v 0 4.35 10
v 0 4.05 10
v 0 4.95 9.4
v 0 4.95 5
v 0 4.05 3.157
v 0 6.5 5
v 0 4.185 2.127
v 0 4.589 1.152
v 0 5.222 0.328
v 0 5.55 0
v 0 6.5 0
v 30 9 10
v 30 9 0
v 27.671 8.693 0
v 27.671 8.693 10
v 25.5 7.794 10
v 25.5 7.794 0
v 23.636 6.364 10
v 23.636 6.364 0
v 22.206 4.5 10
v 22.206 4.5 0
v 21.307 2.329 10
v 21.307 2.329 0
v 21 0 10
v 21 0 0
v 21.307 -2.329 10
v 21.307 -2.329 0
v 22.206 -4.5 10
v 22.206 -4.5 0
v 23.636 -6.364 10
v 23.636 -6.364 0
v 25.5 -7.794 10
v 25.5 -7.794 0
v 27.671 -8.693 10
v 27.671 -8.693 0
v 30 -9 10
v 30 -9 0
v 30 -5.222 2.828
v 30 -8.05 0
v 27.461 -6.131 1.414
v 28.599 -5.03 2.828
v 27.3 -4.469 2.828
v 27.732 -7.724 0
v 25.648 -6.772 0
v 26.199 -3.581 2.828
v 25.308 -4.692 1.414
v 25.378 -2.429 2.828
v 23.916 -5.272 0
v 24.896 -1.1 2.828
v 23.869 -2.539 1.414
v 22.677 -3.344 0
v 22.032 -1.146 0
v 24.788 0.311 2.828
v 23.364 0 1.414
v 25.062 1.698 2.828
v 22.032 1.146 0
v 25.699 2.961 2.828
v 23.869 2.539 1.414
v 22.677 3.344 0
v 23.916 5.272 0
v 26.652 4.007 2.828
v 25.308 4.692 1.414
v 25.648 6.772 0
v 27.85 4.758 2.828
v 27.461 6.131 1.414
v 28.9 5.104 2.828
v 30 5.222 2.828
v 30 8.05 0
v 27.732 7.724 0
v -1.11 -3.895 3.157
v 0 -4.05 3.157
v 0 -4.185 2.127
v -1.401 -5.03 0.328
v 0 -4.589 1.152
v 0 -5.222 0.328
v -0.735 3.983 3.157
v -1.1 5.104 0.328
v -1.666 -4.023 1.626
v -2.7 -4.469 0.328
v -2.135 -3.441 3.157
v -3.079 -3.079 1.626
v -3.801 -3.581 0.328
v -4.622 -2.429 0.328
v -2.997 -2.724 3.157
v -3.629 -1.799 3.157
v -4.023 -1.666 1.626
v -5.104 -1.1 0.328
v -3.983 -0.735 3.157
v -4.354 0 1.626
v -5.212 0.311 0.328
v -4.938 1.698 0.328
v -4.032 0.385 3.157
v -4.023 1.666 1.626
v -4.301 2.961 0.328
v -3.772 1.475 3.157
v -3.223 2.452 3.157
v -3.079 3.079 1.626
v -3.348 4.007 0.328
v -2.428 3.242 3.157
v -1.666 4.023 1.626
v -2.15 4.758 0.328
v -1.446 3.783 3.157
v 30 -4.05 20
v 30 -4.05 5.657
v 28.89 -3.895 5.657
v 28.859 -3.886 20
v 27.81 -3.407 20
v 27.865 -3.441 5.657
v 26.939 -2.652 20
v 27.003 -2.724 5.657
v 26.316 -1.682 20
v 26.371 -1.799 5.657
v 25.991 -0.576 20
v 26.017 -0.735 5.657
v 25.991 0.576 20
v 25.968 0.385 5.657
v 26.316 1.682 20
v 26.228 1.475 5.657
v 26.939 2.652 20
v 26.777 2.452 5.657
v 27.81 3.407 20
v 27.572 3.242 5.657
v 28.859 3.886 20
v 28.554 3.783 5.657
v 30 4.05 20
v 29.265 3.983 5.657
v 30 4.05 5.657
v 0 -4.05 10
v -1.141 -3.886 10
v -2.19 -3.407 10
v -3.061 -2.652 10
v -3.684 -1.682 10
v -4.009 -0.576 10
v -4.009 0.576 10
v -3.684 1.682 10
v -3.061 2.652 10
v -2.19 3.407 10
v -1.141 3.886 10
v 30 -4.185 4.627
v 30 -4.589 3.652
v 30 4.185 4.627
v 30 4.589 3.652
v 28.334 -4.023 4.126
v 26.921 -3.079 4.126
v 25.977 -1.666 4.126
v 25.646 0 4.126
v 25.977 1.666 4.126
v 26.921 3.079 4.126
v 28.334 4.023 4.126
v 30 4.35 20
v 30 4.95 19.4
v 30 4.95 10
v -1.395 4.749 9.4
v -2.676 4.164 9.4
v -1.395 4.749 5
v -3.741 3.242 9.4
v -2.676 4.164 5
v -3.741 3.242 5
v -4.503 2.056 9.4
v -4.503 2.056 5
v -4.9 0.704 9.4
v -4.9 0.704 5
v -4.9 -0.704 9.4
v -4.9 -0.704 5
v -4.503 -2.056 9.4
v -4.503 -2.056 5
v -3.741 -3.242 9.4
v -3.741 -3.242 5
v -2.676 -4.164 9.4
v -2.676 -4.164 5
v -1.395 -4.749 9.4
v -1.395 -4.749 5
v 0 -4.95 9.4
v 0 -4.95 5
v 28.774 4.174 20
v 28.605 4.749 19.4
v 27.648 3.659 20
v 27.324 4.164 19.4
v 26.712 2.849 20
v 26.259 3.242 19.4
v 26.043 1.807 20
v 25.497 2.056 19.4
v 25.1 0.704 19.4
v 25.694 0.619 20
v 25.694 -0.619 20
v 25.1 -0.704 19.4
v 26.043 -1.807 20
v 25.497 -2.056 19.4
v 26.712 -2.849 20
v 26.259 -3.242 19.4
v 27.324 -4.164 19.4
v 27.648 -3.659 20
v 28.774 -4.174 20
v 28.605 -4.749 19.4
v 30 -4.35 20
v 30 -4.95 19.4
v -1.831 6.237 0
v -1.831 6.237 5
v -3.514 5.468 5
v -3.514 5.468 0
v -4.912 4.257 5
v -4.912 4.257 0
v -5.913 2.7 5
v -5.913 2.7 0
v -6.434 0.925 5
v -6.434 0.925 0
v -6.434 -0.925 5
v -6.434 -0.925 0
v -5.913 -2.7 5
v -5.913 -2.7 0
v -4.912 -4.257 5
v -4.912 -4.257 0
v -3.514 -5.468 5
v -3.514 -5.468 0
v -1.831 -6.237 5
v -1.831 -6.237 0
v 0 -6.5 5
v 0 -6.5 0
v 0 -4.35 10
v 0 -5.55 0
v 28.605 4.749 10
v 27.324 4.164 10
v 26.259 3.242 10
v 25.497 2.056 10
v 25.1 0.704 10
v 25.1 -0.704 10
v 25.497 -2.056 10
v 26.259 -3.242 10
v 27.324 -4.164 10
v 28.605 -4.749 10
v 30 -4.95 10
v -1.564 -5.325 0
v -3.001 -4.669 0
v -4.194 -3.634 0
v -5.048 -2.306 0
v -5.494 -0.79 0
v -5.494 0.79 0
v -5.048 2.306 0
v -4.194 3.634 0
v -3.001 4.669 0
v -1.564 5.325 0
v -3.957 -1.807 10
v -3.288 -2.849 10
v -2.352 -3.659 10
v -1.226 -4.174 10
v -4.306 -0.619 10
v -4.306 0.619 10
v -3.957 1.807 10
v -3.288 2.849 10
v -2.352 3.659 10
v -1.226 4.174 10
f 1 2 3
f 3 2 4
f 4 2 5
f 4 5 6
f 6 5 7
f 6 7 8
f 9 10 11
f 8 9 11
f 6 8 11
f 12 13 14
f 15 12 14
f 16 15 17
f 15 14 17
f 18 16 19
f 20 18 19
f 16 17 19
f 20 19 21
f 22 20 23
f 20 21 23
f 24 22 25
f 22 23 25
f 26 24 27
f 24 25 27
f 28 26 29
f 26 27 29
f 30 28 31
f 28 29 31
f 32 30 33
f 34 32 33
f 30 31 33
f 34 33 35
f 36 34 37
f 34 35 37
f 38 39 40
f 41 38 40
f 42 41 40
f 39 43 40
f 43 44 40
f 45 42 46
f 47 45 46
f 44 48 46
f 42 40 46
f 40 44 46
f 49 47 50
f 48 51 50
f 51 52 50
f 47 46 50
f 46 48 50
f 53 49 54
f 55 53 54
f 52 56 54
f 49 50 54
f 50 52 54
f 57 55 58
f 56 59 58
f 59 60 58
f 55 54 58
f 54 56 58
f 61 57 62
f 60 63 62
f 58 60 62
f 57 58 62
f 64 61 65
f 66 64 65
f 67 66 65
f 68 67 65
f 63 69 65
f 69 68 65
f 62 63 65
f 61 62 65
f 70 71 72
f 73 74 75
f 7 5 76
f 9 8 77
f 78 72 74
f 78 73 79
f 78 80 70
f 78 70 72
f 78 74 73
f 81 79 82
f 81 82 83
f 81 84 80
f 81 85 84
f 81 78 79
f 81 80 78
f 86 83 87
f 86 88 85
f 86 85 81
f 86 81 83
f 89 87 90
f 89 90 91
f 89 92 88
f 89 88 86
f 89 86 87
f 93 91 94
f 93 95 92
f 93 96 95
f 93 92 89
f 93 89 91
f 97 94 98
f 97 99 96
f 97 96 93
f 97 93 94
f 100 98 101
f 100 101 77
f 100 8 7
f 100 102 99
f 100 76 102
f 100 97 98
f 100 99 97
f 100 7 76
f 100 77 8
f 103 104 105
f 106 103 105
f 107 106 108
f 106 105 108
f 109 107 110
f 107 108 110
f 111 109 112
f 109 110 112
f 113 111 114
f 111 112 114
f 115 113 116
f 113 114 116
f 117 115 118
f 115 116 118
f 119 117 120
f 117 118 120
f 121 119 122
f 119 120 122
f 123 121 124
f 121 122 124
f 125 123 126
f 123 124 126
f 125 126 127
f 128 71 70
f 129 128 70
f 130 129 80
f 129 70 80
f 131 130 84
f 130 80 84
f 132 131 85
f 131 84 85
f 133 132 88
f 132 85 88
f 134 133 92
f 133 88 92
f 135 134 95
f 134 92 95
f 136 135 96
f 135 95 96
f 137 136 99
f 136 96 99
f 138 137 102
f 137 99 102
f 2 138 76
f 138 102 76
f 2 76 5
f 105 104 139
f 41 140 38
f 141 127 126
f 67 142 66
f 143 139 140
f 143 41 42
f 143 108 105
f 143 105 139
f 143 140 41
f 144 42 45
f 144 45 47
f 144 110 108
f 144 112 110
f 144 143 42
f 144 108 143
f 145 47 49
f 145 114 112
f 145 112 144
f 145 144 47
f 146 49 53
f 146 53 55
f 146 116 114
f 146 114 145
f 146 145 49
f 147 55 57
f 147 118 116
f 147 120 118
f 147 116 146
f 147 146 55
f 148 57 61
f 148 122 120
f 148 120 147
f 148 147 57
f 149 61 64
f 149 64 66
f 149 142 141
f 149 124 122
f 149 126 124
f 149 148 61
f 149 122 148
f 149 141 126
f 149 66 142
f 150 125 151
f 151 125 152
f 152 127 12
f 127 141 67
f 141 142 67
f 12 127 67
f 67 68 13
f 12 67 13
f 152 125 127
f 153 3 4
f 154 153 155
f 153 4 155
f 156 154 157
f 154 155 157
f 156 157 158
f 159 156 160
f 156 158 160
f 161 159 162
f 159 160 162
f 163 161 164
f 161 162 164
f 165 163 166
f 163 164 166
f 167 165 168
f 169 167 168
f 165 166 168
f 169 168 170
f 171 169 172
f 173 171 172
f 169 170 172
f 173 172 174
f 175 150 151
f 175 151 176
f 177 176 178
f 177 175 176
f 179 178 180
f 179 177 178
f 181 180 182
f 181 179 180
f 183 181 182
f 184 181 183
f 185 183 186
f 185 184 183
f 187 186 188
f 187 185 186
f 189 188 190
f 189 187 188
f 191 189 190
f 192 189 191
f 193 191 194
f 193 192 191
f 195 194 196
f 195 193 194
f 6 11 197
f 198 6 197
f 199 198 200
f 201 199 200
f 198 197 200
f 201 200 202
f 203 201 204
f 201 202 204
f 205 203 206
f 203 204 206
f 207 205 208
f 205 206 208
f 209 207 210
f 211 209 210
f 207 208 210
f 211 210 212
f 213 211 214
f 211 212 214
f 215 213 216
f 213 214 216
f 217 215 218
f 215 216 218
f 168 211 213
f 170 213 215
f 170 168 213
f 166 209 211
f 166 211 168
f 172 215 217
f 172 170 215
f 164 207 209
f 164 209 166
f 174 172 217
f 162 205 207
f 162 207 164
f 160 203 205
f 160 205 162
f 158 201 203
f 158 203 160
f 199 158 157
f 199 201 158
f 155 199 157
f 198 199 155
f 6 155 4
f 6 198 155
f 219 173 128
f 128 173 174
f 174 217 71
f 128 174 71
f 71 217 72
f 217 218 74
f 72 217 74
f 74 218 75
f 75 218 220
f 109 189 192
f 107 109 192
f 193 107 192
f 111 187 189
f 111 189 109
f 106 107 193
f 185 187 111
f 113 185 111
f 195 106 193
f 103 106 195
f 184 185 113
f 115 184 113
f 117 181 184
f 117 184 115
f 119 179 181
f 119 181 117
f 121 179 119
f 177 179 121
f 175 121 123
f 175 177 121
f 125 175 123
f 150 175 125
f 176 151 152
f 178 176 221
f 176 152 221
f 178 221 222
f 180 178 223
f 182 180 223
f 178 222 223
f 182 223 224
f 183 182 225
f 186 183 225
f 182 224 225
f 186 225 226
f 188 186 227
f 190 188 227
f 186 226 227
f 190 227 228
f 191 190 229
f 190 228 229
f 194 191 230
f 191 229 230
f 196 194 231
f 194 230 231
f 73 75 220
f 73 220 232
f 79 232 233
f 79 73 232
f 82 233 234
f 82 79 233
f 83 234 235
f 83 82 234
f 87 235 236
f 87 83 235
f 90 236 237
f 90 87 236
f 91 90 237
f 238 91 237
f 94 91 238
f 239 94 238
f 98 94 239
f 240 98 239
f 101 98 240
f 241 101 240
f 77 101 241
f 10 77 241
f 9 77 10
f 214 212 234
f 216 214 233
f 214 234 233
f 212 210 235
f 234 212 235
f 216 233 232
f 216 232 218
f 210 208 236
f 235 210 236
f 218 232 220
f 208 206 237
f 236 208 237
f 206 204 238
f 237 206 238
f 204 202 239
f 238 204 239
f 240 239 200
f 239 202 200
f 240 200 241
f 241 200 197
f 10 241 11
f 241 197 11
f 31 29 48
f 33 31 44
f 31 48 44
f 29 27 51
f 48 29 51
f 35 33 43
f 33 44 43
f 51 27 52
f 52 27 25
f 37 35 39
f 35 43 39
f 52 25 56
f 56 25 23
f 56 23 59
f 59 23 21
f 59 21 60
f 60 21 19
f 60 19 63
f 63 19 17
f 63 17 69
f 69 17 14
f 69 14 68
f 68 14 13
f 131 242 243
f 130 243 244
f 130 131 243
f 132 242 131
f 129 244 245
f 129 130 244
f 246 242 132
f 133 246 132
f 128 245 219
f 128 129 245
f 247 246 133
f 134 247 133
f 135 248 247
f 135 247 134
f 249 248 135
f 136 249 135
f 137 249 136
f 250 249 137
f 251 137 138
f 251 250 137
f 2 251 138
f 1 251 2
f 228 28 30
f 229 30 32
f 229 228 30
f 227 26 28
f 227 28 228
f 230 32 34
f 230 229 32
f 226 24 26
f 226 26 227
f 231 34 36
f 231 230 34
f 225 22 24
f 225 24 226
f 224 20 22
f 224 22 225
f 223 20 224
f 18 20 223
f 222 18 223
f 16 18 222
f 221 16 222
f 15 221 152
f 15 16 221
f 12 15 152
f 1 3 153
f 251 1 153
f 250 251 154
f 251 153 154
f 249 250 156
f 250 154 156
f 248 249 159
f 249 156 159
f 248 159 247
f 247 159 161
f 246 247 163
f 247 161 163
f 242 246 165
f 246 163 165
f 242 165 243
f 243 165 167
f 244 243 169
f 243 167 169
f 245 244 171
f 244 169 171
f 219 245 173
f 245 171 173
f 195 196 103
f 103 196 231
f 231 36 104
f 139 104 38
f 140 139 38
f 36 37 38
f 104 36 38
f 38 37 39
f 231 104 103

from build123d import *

# Parameters (mm, degrees)
F1_DEPTH  = 5
F2_DEPTH  = 10
F3_DEPTH  = 10
F4_DEPTH  = 20
F5_SIZE   = 1.5
F6_SIZE   = 0.6
F6_2_SIZE = 0.6
F7_SIZE   = 4
F8_R      = 4
F8_2_R    = 4


with BuildPart() as f1:
    # F0 (on Top) → F1 (new body)
    with BuildSketch(Plane.XY):
        with BuildLine():
            Line((0, 4.95), (0, 6.5))
            ThreePointArc((0, 6.5), (-6.5, 0), (0, -6.5))
            Line((0, -6.5), (0, -4.95))
            ThreePointArc((0, -4.95), (-4.95, 0), (0, 4.95))
        make_face()
    extrude(amount=F1_DEPTH)

    # F0 (on Top) → F2 (join)
    with BuildSketch(Plane.XY):
        with BuildLine():
            Line((0, 4.05), (0, 4.95))
            ThreePointArc((0, 4.95), (-4.95, 0), (0, -4.95))
            Line((0, -4.95), (0, -4.05))
            ThreePointArc((0, -4.05), (-4.05, 0), (0, 4.05))
        make_face()
    extrude(amount=F2_DEPTH)

    # F5
    f5_edges = [f1.edges().sort_by_distance(p)[0] for p in [
        (-4.05, 0, 0),
    ]]
    chamfer(f5_edges, length=F5_SIZE)

    # F6
    f6_edges = [f1.edges().sort_by_distance(p)[0] for p in [
        (-4.95, 0, 10),
    ]]
    chamfer(f6_edges, length=F6_SIZE)

    # F8
    f8_edges = [f1.edges().sort_by_distance(p)[0] for p in [
        (-4.05, 0, 1.5),
    ]]
    fillet(f8_edges, radius=F8_R)


with BuildPart() as f3:
    # F0 (on Top) → F3 (new body)
    with BuildSketch(Plane.XY):
        with BuildLine():
            Line((30, 4.95), (30, 9))
            ThreePointArc((30, 9), (21, 0), (30, -9))
            Line((30, -9), (30, -4.95))
            ThreePointArc((30, -4.95), (25.05, 0), (30, 4.95))
        make_face()
    extrude(amount=F3_DEPTH)

    # F0 (on Top) → F4 (join)
    with BuildSketch(Plane.XY):
        with BuildLine():
            Line((30, 4.05), (30, 4.95))
            ThreePointArc((30, 4.95), (25.05, 0), (30, -4.95))
            Line((30, -4.95), (30, -4.05))
            ThreePointArc((30, -4.05), (25.95, 0), (30, 4.05))
        make_face()
    extrude(amount=F4_DEPTH)

    # F6#2
    f6_2_edges = [f3.edges().sort_by_distance(p)[0] for p in [
        (25.05, 0, 20),
    ]]
    chamfer(f6_2_edges, length=F6_2_SIZE)

    # F7
    f7_edges = [f3.edges().sort_by_distance(p)[0] for p in [
        (25.95, 0, 0),
    ]]
    chamfer(f7_edges, length=F7_SIZE)

    # F8#2
    f8_2_edges = [f3.edges().sort_by_distance(p)[0] for p in [
        (25.95, 0, 4),
    ]]
    fillet(f8_2_edges, radius=F8_2_R)


solid = Compound([f1.part, f3.part])
